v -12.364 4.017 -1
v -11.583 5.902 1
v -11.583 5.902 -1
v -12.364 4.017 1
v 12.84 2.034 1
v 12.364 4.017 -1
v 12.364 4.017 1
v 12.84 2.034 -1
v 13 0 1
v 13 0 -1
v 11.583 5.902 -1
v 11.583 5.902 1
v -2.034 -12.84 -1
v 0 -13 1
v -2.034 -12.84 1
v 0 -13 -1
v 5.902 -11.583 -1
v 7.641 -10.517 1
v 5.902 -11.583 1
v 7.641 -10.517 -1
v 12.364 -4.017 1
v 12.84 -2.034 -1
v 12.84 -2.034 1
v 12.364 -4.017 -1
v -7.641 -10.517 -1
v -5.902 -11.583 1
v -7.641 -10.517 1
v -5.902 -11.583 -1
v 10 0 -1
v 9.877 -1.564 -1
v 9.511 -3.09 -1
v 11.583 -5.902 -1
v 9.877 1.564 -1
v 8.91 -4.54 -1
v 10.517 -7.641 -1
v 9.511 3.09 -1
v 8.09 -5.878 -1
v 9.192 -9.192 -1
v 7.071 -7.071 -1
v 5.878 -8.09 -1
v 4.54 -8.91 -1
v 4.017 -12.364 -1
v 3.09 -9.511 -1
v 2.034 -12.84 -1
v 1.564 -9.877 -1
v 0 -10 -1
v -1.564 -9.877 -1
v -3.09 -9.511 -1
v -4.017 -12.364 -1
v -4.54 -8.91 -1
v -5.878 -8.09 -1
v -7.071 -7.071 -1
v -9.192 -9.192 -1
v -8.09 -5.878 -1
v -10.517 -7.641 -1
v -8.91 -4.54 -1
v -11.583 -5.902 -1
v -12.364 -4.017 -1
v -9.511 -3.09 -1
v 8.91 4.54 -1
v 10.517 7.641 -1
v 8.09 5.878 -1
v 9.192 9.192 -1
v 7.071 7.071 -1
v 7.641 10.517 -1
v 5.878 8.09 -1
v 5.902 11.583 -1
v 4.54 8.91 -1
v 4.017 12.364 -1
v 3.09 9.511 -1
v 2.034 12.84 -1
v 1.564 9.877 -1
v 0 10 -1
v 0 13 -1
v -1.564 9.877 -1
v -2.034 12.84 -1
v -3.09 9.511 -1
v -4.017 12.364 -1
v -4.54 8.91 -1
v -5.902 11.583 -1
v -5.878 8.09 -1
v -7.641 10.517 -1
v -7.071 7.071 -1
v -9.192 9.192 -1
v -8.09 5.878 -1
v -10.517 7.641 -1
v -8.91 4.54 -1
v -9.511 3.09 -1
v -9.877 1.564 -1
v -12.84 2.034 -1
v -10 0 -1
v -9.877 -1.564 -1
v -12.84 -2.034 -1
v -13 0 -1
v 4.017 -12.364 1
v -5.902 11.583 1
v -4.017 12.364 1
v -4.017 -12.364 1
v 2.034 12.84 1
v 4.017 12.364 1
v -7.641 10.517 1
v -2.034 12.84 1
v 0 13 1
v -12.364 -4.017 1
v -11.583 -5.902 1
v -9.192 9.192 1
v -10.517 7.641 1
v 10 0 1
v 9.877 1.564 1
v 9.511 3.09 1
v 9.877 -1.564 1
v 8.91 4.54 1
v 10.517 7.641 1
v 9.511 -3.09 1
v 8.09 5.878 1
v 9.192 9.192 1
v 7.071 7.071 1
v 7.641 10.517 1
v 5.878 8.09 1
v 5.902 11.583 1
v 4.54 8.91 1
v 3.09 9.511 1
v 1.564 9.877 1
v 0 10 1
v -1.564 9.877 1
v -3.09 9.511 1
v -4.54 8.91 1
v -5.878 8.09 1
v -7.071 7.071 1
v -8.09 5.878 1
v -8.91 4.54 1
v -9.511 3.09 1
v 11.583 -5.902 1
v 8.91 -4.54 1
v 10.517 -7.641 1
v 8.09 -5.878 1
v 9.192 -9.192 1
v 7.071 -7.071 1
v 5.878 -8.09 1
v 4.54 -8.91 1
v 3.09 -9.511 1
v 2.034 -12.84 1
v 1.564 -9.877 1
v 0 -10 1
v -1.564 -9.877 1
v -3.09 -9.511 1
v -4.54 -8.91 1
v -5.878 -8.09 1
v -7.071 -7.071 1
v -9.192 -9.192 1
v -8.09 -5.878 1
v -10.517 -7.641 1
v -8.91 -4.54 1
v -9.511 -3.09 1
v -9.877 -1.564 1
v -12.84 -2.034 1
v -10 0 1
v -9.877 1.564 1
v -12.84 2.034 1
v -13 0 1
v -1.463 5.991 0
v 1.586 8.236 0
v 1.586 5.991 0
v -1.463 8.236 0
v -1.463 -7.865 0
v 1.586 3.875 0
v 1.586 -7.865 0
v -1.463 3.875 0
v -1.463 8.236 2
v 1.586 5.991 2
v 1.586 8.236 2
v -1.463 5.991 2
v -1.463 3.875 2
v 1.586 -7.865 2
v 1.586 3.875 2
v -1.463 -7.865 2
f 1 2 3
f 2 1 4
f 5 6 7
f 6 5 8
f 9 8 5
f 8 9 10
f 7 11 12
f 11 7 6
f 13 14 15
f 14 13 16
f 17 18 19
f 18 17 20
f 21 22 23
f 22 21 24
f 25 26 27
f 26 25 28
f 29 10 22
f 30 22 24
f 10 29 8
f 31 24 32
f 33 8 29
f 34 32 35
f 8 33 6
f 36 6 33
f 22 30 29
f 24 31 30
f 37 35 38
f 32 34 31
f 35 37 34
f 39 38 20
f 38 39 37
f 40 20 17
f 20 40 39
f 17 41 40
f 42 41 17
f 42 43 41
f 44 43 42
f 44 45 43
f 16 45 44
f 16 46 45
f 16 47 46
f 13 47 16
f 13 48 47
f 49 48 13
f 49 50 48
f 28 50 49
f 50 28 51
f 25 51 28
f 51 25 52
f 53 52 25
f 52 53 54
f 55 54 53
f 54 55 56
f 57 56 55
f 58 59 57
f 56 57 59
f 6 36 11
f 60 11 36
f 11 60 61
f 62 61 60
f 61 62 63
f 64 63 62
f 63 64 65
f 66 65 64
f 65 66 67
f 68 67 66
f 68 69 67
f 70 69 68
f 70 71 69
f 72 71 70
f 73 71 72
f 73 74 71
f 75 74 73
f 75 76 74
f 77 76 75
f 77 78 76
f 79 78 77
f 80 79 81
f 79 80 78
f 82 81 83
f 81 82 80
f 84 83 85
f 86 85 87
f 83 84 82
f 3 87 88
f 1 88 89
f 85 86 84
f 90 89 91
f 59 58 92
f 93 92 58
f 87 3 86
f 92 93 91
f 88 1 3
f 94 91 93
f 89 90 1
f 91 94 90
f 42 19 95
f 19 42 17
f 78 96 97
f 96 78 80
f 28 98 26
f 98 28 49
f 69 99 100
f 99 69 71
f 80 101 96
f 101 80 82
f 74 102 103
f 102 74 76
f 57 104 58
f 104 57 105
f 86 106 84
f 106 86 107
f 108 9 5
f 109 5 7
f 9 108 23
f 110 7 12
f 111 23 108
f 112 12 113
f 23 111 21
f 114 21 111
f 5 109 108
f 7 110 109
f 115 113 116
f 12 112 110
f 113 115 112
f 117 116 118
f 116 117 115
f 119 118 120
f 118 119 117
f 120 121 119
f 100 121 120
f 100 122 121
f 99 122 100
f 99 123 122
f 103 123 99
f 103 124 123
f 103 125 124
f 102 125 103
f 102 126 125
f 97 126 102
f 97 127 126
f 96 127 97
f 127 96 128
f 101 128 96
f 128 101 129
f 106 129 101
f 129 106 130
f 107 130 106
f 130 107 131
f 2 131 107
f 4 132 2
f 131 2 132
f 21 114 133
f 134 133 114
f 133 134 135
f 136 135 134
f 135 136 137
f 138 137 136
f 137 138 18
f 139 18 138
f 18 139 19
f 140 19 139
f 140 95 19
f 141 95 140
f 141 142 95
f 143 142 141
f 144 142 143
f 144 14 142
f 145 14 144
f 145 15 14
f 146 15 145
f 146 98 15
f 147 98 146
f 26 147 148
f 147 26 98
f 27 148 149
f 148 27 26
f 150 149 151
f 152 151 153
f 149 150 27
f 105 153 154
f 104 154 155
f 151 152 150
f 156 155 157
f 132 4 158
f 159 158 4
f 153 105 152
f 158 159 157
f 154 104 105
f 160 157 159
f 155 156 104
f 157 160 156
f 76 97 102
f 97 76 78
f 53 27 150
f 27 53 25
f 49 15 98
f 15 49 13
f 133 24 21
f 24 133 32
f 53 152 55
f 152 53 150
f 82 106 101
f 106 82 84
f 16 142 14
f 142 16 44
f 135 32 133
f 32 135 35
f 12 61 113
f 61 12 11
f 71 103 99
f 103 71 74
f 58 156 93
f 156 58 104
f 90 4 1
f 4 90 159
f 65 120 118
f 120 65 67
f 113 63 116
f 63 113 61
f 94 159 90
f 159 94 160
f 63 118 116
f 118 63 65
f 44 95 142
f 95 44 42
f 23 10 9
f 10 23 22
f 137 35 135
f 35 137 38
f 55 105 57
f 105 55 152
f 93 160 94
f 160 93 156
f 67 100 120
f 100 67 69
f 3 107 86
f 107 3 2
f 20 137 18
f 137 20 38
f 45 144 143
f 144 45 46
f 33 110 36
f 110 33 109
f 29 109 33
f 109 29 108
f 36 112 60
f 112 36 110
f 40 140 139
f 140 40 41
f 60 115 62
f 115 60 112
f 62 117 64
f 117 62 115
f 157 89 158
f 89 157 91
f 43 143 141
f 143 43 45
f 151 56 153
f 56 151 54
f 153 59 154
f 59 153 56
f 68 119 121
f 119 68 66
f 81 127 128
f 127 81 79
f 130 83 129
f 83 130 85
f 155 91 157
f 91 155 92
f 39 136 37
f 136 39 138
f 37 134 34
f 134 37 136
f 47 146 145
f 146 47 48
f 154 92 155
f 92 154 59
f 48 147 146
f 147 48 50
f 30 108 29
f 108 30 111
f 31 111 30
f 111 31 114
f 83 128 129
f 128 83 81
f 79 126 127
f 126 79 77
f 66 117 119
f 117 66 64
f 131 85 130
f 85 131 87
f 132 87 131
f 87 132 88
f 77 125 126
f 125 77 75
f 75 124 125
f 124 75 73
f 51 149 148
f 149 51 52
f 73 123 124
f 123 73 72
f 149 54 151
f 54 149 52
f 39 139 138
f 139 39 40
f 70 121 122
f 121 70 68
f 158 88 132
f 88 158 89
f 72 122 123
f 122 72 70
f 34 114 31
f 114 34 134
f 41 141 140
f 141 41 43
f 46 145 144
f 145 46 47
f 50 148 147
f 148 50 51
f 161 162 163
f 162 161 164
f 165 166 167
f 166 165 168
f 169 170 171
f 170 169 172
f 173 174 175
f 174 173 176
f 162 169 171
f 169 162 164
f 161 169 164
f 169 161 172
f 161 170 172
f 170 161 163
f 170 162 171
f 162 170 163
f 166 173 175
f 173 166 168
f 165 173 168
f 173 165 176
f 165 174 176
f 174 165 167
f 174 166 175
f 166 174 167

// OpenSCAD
module OpenInfoPanelIcon() {
  difference() {
    cylinder(r = 13, h = 2, center = true);
    cylinder(r = 10, h = 4, center = true);
  }
  linear_extrude(2)
    text("i", halign = "center", valign = "center", size = 16,
         font="Liberation Sans:style=Bold");
}

OpenInfoPanelIcon($fn = 40);
